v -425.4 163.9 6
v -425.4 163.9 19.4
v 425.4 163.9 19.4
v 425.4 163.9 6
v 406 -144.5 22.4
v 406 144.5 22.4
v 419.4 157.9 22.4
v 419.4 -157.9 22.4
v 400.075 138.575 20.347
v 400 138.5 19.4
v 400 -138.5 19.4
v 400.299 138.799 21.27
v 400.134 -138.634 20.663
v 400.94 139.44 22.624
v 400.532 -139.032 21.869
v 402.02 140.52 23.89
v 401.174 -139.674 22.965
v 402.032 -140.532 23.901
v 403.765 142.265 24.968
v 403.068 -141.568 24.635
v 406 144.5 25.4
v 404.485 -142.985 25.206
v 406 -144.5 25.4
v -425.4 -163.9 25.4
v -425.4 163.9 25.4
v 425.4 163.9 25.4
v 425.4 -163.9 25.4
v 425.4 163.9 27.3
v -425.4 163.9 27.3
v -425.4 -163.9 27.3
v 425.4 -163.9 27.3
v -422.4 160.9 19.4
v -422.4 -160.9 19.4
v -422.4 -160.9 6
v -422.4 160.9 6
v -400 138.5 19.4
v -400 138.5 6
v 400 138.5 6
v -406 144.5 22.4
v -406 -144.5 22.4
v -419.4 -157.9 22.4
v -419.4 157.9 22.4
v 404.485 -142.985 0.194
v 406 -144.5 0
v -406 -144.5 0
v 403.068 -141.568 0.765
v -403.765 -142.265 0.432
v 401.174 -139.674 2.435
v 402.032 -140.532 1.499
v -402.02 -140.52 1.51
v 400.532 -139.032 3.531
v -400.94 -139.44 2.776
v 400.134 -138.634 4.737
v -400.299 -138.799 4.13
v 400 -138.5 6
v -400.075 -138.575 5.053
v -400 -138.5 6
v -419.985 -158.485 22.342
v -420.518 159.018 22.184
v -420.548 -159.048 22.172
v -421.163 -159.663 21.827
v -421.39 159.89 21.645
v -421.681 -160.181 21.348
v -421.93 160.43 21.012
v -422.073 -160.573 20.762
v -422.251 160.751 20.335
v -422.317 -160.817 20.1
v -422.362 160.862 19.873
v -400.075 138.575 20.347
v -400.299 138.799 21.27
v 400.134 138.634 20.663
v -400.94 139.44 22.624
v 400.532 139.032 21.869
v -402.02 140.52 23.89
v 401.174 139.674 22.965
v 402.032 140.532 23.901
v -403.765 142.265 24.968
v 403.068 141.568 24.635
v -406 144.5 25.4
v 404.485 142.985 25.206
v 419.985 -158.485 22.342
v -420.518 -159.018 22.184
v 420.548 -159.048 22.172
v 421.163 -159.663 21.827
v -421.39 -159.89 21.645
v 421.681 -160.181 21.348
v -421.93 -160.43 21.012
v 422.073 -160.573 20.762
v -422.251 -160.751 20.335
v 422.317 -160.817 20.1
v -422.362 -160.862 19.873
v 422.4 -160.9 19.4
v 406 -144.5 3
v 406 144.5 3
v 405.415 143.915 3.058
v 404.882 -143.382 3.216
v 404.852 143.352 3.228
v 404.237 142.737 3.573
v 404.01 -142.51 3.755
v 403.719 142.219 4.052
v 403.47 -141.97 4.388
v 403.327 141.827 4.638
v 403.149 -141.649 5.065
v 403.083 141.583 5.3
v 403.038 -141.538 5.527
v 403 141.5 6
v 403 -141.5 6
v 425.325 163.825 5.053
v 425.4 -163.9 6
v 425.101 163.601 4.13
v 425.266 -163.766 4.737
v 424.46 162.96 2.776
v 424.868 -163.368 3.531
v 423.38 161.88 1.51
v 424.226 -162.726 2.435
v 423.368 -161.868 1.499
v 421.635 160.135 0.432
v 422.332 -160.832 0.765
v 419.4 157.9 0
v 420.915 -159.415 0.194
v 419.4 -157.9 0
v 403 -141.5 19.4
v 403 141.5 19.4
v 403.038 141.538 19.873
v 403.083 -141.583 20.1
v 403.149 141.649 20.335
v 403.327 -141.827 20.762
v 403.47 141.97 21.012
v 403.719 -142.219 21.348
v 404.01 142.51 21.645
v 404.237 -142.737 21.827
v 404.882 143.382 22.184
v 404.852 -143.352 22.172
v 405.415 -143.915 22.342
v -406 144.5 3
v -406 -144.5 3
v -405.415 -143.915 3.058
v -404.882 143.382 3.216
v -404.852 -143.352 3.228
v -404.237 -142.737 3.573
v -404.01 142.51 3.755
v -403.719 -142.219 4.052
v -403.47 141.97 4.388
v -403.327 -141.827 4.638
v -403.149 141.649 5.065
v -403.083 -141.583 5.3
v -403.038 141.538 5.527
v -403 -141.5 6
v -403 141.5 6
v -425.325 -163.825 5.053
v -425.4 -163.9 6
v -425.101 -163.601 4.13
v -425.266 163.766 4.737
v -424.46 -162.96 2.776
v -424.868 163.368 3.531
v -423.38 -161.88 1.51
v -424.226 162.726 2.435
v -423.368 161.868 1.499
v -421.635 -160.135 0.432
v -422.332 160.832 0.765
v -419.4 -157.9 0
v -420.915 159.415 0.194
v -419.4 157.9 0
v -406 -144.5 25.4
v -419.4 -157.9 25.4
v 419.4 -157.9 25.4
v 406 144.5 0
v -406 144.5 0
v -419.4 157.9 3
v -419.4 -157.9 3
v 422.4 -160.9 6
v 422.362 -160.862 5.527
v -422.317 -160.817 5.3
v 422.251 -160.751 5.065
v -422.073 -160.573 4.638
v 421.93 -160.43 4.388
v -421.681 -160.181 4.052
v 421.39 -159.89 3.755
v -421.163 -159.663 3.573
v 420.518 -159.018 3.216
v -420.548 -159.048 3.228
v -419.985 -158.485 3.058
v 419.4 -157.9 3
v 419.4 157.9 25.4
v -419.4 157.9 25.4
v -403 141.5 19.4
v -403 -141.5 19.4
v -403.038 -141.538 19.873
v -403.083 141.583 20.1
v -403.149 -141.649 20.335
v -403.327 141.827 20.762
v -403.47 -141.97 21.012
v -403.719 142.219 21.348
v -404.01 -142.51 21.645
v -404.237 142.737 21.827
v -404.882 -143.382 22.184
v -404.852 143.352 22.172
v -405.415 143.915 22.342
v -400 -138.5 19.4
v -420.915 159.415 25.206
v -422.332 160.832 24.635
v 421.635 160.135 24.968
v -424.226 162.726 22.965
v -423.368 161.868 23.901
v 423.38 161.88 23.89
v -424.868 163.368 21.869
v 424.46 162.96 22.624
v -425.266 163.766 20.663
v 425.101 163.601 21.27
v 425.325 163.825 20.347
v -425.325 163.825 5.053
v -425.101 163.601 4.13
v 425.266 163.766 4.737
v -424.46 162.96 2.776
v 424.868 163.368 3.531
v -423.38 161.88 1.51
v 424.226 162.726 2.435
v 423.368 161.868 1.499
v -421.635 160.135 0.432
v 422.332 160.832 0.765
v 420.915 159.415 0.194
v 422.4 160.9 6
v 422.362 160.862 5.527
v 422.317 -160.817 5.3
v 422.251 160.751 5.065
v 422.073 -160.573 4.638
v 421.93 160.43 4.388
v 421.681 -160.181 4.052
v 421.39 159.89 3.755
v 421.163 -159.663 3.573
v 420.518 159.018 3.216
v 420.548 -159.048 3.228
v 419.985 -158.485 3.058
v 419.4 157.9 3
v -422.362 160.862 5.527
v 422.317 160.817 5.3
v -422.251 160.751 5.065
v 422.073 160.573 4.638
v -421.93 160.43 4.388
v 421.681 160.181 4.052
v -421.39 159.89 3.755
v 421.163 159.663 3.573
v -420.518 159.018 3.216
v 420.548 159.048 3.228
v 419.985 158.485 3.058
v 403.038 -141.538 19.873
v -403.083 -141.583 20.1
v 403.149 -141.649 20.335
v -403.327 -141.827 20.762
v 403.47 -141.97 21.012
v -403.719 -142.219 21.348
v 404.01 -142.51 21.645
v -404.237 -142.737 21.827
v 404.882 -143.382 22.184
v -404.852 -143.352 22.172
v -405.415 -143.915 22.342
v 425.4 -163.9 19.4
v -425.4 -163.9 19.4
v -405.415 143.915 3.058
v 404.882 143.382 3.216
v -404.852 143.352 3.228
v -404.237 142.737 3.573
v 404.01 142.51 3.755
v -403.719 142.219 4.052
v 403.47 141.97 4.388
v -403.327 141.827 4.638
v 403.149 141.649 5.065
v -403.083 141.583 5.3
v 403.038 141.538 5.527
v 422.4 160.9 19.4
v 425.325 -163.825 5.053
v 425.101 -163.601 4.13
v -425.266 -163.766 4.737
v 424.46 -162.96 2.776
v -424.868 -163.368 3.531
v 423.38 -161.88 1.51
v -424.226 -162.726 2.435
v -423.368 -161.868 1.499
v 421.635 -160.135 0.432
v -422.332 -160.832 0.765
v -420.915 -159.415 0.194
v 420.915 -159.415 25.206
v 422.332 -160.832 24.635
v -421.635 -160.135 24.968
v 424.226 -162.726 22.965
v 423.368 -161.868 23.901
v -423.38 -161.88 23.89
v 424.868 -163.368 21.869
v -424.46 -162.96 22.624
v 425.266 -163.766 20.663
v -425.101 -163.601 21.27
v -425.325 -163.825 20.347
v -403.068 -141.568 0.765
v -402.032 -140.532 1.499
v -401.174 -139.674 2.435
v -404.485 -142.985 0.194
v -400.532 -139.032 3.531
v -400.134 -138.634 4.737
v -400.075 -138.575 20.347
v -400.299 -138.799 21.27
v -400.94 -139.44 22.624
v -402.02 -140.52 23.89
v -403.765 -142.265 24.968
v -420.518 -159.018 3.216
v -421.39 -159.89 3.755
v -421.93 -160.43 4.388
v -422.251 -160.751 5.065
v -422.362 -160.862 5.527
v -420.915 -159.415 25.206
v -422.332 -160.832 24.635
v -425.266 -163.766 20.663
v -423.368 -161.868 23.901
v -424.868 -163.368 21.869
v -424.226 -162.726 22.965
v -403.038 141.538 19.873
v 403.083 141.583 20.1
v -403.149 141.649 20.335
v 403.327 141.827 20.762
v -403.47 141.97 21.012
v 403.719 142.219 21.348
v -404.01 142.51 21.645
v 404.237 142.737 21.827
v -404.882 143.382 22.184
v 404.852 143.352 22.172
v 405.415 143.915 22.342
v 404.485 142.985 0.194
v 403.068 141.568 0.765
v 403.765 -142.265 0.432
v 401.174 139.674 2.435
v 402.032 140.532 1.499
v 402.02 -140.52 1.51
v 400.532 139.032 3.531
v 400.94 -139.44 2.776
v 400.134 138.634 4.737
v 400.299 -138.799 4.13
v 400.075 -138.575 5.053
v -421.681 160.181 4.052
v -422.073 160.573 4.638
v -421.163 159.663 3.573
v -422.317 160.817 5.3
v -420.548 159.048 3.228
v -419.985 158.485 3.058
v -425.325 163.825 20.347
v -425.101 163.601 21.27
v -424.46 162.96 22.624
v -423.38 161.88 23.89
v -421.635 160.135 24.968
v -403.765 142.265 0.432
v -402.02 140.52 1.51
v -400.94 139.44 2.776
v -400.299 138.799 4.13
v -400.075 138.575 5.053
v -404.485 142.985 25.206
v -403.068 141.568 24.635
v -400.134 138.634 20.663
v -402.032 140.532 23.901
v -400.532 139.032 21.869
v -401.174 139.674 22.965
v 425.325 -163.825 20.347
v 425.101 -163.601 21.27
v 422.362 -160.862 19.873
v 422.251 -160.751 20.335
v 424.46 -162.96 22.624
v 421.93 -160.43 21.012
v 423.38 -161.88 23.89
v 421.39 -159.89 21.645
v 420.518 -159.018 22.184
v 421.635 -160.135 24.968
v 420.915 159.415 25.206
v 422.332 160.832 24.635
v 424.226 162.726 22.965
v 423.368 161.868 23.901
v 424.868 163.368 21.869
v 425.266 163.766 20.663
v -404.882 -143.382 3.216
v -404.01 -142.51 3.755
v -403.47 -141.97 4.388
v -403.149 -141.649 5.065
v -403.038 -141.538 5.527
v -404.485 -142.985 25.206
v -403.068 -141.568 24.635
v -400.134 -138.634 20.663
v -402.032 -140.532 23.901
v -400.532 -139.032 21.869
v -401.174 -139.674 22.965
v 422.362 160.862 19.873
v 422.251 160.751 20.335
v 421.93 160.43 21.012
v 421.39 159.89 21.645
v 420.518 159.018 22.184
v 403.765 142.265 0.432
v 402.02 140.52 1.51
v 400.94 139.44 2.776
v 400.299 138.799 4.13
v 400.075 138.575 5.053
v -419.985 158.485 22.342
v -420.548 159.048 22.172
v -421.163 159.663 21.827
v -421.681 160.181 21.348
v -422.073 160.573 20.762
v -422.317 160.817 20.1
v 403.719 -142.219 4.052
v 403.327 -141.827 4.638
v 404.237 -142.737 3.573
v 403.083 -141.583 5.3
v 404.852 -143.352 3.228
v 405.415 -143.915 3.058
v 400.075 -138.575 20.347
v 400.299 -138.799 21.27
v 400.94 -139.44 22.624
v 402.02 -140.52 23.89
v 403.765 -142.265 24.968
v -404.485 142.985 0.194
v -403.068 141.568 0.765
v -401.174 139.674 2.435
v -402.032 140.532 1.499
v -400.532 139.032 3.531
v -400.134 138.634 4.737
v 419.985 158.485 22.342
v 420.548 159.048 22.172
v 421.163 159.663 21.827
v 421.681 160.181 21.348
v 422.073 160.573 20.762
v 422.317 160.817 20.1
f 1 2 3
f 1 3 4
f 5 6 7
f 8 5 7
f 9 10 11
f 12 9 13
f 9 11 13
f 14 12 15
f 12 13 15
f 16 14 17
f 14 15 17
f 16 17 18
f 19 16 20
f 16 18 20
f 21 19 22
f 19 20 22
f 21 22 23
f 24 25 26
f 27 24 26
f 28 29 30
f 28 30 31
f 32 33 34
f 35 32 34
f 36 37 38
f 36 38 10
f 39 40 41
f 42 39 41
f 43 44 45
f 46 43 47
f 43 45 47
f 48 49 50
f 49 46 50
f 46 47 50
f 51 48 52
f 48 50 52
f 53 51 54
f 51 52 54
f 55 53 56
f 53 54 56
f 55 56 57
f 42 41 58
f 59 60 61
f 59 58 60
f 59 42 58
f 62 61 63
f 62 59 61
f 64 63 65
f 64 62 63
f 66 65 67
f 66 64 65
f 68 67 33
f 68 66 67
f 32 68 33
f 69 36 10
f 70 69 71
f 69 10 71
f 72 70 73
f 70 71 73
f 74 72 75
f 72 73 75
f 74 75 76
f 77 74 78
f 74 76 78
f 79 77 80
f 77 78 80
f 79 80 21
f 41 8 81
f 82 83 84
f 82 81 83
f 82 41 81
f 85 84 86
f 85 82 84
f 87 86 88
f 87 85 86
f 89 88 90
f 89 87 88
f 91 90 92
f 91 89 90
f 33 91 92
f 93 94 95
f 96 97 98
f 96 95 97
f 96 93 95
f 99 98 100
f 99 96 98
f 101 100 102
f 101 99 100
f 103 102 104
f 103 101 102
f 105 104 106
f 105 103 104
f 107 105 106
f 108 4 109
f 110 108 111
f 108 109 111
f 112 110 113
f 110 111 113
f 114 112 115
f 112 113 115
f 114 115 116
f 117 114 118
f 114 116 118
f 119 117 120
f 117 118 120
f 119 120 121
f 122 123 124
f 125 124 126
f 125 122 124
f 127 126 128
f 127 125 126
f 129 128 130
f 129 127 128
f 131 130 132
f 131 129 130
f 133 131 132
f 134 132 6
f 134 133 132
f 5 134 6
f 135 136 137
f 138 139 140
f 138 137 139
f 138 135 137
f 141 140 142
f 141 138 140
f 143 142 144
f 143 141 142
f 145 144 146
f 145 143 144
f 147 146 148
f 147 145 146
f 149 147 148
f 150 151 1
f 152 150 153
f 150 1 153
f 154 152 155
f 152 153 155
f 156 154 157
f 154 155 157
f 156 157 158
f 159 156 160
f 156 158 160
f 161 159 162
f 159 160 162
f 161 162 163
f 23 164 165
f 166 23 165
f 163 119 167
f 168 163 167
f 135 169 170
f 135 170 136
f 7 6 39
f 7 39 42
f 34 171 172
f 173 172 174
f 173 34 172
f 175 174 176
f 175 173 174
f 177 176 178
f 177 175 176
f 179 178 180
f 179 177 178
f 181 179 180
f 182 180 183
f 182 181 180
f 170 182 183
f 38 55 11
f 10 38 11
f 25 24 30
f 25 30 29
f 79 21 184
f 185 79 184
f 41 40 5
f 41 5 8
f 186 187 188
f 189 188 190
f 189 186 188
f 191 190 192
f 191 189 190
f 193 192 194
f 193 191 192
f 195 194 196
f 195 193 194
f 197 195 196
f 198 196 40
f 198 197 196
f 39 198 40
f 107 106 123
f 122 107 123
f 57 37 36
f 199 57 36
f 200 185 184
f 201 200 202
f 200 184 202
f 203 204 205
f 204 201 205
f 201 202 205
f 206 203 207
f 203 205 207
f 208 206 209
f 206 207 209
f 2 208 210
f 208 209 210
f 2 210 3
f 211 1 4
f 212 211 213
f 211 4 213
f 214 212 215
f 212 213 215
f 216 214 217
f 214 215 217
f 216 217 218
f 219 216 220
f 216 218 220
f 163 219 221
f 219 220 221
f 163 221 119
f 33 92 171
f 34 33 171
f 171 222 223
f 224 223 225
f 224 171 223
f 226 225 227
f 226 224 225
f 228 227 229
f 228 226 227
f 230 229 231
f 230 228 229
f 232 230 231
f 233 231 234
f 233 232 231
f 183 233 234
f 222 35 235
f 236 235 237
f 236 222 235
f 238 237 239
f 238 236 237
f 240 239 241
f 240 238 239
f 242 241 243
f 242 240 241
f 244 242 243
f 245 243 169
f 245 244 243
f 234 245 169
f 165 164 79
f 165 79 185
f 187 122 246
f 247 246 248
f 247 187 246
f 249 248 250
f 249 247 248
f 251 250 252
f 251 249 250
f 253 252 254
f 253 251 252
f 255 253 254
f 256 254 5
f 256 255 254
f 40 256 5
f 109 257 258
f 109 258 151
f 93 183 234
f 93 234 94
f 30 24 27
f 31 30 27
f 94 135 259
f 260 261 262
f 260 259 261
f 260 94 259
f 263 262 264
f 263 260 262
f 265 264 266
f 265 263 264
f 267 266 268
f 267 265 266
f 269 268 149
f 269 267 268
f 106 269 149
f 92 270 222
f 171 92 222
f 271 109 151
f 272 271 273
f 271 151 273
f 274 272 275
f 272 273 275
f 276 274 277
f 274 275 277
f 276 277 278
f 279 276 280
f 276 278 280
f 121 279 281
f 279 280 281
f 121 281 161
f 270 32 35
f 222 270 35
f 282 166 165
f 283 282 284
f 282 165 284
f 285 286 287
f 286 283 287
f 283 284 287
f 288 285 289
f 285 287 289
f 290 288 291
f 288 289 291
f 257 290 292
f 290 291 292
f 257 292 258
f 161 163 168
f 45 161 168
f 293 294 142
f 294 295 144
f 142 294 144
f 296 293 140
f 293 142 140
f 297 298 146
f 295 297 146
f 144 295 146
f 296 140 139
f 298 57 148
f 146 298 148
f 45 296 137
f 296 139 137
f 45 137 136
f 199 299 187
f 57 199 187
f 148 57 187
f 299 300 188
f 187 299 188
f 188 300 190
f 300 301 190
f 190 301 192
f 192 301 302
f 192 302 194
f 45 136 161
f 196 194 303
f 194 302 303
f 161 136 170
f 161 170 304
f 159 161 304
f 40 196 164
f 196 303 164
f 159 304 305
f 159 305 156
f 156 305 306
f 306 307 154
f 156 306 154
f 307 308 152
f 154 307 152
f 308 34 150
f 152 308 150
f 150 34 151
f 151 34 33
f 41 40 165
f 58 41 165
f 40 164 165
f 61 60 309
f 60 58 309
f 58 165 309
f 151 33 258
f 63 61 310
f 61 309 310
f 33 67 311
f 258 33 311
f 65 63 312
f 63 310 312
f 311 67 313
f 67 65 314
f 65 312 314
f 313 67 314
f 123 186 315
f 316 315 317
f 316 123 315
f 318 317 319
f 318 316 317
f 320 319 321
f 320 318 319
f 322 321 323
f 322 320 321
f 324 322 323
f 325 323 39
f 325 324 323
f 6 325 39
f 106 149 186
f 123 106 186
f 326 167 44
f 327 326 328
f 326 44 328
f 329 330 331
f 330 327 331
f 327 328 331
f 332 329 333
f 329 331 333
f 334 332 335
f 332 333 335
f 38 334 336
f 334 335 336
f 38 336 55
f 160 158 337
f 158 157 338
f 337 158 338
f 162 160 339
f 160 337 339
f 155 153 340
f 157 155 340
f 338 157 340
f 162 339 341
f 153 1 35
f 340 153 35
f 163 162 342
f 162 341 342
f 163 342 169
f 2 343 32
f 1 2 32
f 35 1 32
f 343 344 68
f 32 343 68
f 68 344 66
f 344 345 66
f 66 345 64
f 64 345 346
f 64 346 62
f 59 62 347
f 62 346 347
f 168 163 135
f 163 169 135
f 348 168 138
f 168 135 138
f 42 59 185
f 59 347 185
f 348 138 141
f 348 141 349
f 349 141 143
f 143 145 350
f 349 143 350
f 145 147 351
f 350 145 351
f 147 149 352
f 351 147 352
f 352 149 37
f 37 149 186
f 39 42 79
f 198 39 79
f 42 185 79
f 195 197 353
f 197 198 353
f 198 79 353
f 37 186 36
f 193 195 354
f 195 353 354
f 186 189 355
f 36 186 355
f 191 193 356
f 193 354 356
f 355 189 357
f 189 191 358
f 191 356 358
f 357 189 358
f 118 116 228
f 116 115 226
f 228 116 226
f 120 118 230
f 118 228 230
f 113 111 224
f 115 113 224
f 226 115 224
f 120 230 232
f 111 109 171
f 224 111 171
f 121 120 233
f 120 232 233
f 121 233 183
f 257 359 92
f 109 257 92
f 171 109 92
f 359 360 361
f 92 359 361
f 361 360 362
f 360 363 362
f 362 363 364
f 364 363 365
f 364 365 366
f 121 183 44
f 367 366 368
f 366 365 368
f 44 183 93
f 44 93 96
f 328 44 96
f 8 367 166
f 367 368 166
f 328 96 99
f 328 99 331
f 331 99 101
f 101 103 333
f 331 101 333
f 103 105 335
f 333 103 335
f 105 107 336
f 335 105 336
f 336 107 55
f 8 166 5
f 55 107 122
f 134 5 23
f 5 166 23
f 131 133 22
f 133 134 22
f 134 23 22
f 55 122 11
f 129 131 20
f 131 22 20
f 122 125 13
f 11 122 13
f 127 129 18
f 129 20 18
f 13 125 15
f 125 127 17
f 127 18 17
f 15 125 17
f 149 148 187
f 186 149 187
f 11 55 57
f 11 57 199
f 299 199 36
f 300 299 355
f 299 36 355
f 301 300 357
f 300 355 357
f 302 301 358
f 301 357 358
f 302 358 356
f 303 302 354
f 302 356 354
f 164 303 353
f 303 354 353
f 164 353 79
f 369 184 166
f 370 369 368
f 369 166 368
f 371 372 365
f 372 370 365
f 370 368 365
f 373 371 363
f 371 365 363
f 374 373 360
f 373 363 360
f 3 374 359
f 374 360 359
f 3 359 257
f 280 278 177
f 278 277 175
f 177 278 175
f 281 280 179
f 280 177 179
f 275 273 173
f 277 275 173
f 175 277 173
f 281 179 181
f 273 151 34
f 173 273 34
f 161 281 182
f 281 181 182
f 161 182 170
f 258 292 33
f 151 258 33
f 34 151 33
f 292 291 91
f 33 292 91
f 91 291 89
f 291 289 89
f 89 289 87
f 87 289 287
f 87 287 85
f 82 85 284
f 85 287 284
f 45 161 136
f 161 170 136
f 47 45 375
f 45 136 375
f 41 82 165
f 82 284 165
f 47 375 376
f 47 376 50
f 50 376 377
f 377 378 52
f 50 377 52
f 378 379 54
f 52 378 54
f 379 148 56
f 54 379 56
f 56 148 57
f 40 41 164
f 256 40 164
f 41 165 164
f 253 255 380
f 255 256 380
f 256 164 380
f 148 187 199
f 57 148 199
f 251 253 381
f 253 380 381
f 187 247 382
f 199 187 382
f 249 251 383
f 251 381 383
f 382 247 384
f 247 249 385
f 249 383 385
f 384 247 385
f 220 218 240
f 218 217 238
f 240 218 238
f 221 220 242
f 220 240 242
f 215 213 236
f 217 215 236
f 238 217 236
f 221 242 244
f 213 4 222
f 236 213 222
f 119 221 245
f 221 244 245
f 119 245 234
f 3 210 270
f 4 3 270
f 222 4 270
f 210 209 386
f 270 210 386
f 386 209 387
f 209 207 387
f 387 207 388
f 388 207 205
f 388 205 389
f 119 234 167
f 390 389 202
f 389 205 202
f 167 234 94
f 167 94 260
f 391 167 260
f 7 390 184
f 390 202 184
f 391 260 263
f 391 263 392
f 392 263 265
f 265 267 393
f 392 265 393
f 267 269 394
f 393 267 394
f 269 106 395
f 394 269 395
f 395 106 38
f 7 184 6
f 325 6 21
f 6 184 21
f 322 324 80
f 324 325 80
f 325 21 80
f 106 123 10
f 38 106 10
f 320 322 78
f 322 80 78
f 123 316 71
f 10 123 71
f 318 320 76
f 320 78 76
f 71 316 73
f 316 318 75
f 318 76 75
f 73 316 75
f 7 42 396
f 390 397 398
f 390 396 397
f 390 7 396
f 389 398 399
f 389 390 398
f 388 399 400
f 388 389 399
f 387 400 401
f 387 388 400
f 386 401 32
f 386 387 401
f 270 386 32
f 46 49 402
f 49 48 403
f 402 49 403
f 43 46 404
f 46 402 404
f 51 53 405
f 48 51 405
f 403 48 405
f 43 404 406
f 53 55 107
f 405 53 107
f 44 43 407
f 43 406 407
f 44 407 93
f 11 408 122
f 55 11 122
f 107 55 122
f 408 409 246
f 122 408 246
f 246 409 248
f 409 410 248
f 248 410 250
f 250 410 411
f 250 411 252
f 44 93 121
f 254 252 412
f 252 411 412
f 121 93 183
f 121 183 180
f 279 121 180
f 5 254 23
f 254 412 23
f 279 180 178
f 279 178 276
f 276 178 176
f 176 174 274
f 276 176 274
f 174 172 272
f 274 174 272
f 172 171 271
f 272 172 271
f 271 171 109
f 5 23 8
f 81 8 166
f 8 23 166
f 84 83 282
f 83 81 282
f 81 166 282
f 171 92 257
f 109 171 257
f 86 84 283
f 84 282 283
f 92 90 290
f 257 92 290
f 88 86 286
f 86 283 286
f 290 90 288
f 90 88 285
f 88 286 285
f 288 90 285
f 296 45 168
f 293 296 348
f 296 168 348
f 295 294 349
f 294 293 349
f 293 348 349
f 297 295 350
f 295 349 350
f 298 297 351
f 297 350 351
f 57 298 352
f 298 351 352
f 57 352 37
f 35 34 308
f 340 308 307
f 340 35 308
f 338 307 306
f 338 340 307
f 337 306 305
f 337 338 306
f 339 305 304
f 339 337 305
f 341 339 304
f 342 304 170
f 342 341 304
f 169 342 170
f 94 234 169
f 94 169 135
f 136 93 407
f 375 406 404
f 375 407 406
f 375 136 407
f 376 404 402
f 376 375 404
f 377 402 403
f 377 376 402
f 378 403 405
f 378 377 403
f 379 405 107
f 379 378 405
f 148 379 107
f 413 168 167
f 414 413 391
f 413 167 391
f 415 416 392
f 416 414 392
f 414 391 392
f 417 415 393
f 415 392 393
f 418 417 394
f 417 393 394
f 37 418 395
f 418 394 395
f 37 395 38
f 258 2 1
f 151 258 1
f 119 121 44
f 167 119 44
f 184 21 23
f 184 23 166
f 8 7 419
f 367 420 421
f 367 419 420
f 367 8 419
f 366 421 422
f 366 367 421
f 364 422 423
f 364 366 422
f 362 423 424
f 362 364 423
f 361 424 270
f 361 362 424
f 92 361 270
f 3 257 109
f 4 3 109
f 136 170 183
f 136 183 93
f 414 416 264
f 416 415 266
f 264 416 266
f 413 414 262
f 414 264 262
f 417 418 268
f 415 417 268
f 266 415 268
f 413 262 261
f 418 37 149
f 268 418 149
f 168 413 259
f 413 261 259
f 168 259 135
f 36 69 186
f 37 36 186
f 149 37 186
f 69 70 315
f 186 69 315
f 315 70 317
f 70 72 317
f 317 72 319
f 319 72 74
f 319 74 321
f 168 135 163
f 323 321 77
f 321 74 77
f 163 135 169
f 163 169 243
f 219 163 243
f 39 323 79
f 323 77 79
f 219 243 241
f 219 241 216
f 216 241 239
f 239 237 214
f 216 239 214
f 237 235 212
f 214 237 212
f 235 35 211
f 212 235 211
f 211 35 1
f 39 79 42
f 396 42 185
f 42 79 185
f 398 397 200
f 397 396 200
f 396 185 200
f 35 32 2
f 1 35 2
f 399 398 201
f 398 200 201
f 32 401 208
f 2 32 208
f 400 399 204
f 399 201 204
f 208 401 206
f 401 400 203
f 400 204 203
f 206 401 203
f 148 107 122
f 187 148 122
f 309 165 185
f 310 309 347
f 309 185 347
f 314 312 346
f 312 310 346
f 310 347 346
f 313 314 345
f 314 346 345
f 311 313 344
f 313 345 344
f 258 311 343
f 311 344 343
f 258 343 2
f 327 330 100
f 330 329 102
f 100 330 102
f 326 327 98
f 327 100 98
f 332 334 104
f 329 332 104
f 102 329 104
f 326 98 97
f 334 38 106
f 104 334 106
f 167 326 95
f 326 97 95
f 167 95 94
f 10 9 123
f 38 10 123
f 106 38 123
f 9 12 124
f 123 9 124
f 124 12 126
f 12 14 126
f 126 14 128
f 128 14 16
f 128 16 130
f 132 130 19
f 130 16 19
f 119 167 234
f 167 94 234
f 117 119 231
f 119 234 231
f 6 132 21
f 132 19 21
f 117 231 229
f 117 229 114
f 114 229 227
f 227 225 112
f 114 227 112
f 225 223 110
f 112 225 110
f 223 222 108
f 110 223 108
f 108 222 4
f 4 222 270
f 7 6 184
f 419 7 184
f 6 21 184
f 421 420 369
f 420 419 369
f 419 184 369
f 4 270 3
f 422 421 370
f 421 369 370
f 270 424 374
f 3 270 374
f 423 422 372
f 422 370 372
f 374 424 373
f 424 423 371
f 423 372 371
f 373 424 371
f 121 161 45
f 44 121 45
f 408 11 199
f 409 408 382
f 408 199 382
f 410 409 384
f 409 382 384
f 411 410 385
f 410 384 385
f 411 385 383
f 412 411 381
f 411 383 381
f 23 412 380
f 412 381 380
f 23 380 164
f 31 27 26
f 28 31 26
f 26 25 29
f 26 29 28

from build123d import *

# Parameters (mm, degrees)
TUBO_CUADRADO_2_X_2_X_0_25_1_DEPTH      = 313.921024484
TUBO_CUADRADO_2_X_2_X_0_25_1_DEPTH_BACK = 36.921024484
TUBO_CUADRADO_2_X_2_X_0_25_1_2_DEPTH    = 873.842048969
TUBO_CUADRADO_2_X_2_X_0_25_1_3_DEPTH    = 350.842048969
TUBO_CUADRADO_2_X_2_X_0_25_1_4_DEPTH    = 873.842048969
CROQUIS3_W                              = 850.8
CROQUIS3_H                              = 327.8
SALIENTE_EXTRUIR1_DEPTH                 = 1.9


with BuildPart() as part:
    # Sketch1 → Tubo cuadrado 2 X 2 X 0.25(1) (new, two sides: drawn at the far end of the back side and taken through both)
    with BuildSketch(Plane(origin=(-412.7, 138.5, 12.7), x_dir=(1, 0, 0), z_dir=(0, -1, 0)).offset(-TUBO_CUADRADO_2_X_2_X_0_25_1_DEPTH_BACK)):
        with BuildLine():
            Line((-6.7, -12.7), (6.7, -12.7))
            ThreePointArc((6.7, -12.7), (10.942640687, -10.942640687), (12.7, -6.7))
            Line((12.7, -6.7), (12.7, 6.7))
            ThreePointArc((12.7, 6.7), (10.942640687, 10.942640687), (6.7, 12.7))
            Line((6.7, 12.7), (-6.7, 12.7))
            ThreePointArc((-6.7, 12.7), (-10.942640687, 10.942640687), (-12.7, 6.7))
            Line((-12.7, 6.7), (-12.7, -6.7))
            ThreePointArc((-12.7, -6.7), (-10.942640687, -10.942640687), (-6.7, -12.7))
        make_face()
        with BuildLine():
            Line((-6.7, -9.7), (6.7, -9.7))
            ThreePointArc((6.7, -9.7), (8.821320344, -8.821320344), (9.7, -6.7))
            Line((9.7, -6.7), (9.7, 6.7))
            ThreePointArc((9.7, 6.7), (8.821320344, 8.821320344), (6.7, 9.7))
            Line((6.7, 9.7), (-6.7, 9.7))
            ThreePointArc((-6.7, 9.7), (-8.821320344, 8.821320344), (-9.7, 6.7))
            Line((-9.7, 6.7), (-9.7, -6.7))
            ThreePointArc((-9.7, -6.7), (-8.821320344, -8.821320344), (-6.7, -9.7))
        make_face(mode=Mode.SUBTRACT)
    extrude(amount=TUBO_CUADRADO_2_X_2_X_0_25_1_DEPTH + TUBO_CUADRADO_2_X_2_X_0_25_1_DEPTH_BACK)

    # Tubo cuadrado 2 X 2 X 0.25(1) mitre 1
    split(bisect_by=Plane(origin=(-400, 138.5, 0), x_dir=(0.707106781, -0.707106781, 0), z_dir=(-0.707106781, -0.707106781, 0)), keep=Keep.TOP)

    # Tubo cuadrado 2 X 2 X 0.25(1) mitre 2
    split(bisect_by=Plane(origin=(-400, -138.5, 0), x_dir=(-0.707106781, -0.707106781, 0), z_dir=(-0.707106781, 0.707106781, 0)), keep=Keep.TOP)


with BuildPart() as body_2:
    # Sketch1 on segment 2 (carried to segment 2) → Tubo cuadrado 2 X 2 X 0.25_1 2 (new body)
    with BuildSketch(Plane(origin=(-436.921024484, -151.2, 12.7), x_dir=(0, 1, 0), z_dir=(1, 0, 0))):
        with BuildLine():
            Line((-6.7, -12.7), (6.7, -12.7))
            ThreePointArc((6.7, -12.7), (10.942640687, -10.942640687), (12.7, -6.7))
            Line((12.7, -6.7), (12.7, 6.7))
            ThreePointArc((12.7, 6.7), (10.942640687, 10.942640687), (6.7, 12.7))
            Line((6.7, 12.7), (-6.7, 12.7))
            ThreePointArc((-6.7, 12.7), (-10.942640687, 10.942640687), (-12.7, 6.7))
            Line((-12.7, 6.7), (-12.7, -6.7))
            ThreePointArc((-12.7, -6.7), (-10.942640687, -10.942640687), (-6.7, -12.7))
        make_face()
        with BuildLine():
            Line((-6.7, -9.7), (6.7, -9.7))
            ThreePointArc((6.7, -9.7), (8.821320344, -8.821320344), (9.7, -6.7))
            Line((9.7, -6.7), (9.7, 6.7))
            ThreePointArc((9.7, 6.7), (8.821320344, 8.821320344), (6.7, 9.7))
            Line((6.7, 9.7), (-6.7, 9.7))
            ThreePointArc((-6.7, 9.7), (-8.821320344, 8.821320344), (-9.7, 6.7))
            Line((-9.7, 6.7), (-9.7, -6.7))
            ThreePointArc((-9.7, -6.7), (-8.821320344, -8.821320344), (-6.7, -9.7))
        make_face(mode=Mode.SUBTRACT)
    extrude(amount=TUBO_CUADRADO_2_X_2_X_0_25_1_2_DEPTH)

    # Tubo cuadrado 2 X 2 X 0.25_1 2 mitre 1
    split(bisect_by=Plane(origin=(-400, -138.5, 0), x_dir=(0.707106781, 0.707106781, 0), z_dir=(0.707106781, -0.707106781, 0)), keep=Keep.TOP)

    # Tubo cuadrado 2 X 2 X 0.25_1 2 mitre 2
    split(bisect_by=Plane(origin=(400, -138.5, 0), x_dir=(0.707106781, -0.707106781, 0), z_dir=(-0.707106781, -0.707106781, 0)), keep=Keep.TOP)


with BuildPart() as body_3:
    # Sketch1 on segment 3 (carried to segment 3) → Tubo cuadrado 2 X 2 X 0.25_1 3 (new body)
    with BuildSketch(Plane(origin=(412.7, -175.421024484, 12.7), x_dir=(-1, 0, 0), z_dir=(0, 1, 0))):
        with BuildLine():
            Line((-6.7, -12.7), (6.7, -12.7))
            ThreePointArc((6.7, -12.7), (10.942640687, -10.942640687), (12.7, -6.7))
            Line((12.7, -6.7), (12.7, 6.7))
            ThreePointArc((12.7, 6.7), (10.942640687, 10.942640687), (6.7, 12.7))
            Line((6.7, 12.7), (-6.7, 12.7))
            ThreePointArc((-6.7, 12.7), (-10.942640687, 10.942640687), (-12.7, 6.7))
            Line((-12.7, 6.7), (-12.7, -6.7))
            ThreePointArc((-12.7, -6.7), (-10.942640687, -10.942640687), (-6.7, -12.7))
        make_face()
        with BuildLine():
            Line((-6.7, -9.7), (6.7, -9.7))
            ThreePointArc((6.7, -9.7), (8.821320344, -8.821320344), (9.7, -6.7))
            Line((9.7, -6.7), (9.7, 6.7))
            ThreePointArc((9.7, 6.7), (8.821320344, 8.821320344), (6.7, 9.7))
            Line((6.7, 9.7), (-6.7, 9.7))
            ThreePointArc((-6.7, 9.7), (-8.821320344, 8.821320344), (-9.7, 6.7))
            Line((-9.7, 6.7), (-9.7, -6.7))
            ThreePointArc((-9.7, -6.7), (-8.821320344, -8.821320344), (-6.7, -9.7))
        make_face(mode=Mode.SUBTRACT)
    extrude(amount=TUBO_CUADRADO_2_X_2_X_0_25_1_3_DEPTH)

    # Tubo cuadrado 2 X 2 X 0.25_1 3 mitre 1
    split(bisect_by=Plane(origin=(400, 138.5, 0), x_dir=(0.707106781, 0.707106781, 0), z_dir=(0.707106781, -0.707106781, 0)), keep=Keep.TOP)

    # Tubo cuadrado 2 X 2 X 0.25_1 3 mitre 2
    split(bisect_by=Plane(origin=(400, -138.5, 0), x_dir=(-0.707106781, 0.707106781, 0), z_dir=(0.707106781, 0.707106781, 0)), keep=Keep.TOP)


with BuildPart() as body_4:
    # Sketch1 on segment 4 (carried to segment 4) → Tubo cuadrado 2 X 2 X 0.25_1 4 (new body)
    with BuildSketch(Plane(origin=(436.921024484, 151.2, 12.7), x_dir=(0, -1, 0), z_dir=(-1, 0, 0))):
        with BuildLine():
            Line((-6.7, -12.7), (6.7, -12.7))
            ThreePointArc((6.7, -12.7), (10.942640687, -10.942640687), (12.7, -6.7))
            Line((12.7, -6.7), (12.7, 6.7))
            ThreePointArc((12.7, 6.7), (10.942640687, 10.942640687), (6.7, 12.7))
            Line((6.7, 12.7), (-6.7, 12.7))
            ThreePointArc((-6.7, 12.7), (-10.942640687, 10.942640687), (-12.7, 6.7))
            Line((-12.7, 6.7), (-12.7, -6.7))
            ThreePointArc((-12.7, -6.7), (-10.942640687, -10.942640687), (-6.7, -12.7))
        make_face()
        with BuildLine():
            Line((-6.7, -9.7), (6.7, -9.7))
            ThreePointArc((6.7, -9.7), (8.821320344, -8.821320344), (9.7, -6.7))
            Line((9.7, -6.7), (9.7, 6.7))
            ThreePointArc((9.7, 6.7), (8.821320344, 8.821320344), (6.7, 9.7))
            Line((6.7, 9.7), (-6.7, 9.7))
            ThreePointArc((-6.7, 9.7), (-8.821320344, 8.821320344), (-9.7, 6.7))
            Line((-9.7, 6.7), (-9.7, -6.7))
            ThreePointArc((-9.7, -6.7), (-8.821320344, -8.821320344), (-6.7, -9.7))
        make_face(mode=Mode.SUBTRACT)
    extrude(amount=TUBO_CUADRADO_2_X_2_X_0_25_1_4_DEPTH)

    # Tubo cuadrado 2 X 2 X 0.25_1 4 mitre 1
    split(bisect_by=Plane(origin=(-400, 138.5, 0), x_dir=(-0.707106781, 0.707106781, 0), z_dir=(0.707106781, 0.707106781, 0)), keep=Keep.TOP)

    # Tubo cuadrado 2 X 2 X 0.25_1 4 mitre 2
    split(bisect_by=Plane(origin=(400, 138.5, 0), x_dir=(-0.707106781, -0.707106781, 0), z_dir=(-0.707106781, 0.707106781, 0)), keep=Keep.TOP)


with BuildPart() as body_5:
    # Croquis3 → Saliente-Extruir1 (new body)
    with BuildSketch(Plane.XY.offset(25.4)):
        Rectangle(CROQUIS3_W, CROQUIS3_H)
    extrude(amount=SALIENTE_EXTRUIR1_DEPTH)


solid = Compound([part.part, body_2.part, body_3.part, body_4.part, body_5.part])
